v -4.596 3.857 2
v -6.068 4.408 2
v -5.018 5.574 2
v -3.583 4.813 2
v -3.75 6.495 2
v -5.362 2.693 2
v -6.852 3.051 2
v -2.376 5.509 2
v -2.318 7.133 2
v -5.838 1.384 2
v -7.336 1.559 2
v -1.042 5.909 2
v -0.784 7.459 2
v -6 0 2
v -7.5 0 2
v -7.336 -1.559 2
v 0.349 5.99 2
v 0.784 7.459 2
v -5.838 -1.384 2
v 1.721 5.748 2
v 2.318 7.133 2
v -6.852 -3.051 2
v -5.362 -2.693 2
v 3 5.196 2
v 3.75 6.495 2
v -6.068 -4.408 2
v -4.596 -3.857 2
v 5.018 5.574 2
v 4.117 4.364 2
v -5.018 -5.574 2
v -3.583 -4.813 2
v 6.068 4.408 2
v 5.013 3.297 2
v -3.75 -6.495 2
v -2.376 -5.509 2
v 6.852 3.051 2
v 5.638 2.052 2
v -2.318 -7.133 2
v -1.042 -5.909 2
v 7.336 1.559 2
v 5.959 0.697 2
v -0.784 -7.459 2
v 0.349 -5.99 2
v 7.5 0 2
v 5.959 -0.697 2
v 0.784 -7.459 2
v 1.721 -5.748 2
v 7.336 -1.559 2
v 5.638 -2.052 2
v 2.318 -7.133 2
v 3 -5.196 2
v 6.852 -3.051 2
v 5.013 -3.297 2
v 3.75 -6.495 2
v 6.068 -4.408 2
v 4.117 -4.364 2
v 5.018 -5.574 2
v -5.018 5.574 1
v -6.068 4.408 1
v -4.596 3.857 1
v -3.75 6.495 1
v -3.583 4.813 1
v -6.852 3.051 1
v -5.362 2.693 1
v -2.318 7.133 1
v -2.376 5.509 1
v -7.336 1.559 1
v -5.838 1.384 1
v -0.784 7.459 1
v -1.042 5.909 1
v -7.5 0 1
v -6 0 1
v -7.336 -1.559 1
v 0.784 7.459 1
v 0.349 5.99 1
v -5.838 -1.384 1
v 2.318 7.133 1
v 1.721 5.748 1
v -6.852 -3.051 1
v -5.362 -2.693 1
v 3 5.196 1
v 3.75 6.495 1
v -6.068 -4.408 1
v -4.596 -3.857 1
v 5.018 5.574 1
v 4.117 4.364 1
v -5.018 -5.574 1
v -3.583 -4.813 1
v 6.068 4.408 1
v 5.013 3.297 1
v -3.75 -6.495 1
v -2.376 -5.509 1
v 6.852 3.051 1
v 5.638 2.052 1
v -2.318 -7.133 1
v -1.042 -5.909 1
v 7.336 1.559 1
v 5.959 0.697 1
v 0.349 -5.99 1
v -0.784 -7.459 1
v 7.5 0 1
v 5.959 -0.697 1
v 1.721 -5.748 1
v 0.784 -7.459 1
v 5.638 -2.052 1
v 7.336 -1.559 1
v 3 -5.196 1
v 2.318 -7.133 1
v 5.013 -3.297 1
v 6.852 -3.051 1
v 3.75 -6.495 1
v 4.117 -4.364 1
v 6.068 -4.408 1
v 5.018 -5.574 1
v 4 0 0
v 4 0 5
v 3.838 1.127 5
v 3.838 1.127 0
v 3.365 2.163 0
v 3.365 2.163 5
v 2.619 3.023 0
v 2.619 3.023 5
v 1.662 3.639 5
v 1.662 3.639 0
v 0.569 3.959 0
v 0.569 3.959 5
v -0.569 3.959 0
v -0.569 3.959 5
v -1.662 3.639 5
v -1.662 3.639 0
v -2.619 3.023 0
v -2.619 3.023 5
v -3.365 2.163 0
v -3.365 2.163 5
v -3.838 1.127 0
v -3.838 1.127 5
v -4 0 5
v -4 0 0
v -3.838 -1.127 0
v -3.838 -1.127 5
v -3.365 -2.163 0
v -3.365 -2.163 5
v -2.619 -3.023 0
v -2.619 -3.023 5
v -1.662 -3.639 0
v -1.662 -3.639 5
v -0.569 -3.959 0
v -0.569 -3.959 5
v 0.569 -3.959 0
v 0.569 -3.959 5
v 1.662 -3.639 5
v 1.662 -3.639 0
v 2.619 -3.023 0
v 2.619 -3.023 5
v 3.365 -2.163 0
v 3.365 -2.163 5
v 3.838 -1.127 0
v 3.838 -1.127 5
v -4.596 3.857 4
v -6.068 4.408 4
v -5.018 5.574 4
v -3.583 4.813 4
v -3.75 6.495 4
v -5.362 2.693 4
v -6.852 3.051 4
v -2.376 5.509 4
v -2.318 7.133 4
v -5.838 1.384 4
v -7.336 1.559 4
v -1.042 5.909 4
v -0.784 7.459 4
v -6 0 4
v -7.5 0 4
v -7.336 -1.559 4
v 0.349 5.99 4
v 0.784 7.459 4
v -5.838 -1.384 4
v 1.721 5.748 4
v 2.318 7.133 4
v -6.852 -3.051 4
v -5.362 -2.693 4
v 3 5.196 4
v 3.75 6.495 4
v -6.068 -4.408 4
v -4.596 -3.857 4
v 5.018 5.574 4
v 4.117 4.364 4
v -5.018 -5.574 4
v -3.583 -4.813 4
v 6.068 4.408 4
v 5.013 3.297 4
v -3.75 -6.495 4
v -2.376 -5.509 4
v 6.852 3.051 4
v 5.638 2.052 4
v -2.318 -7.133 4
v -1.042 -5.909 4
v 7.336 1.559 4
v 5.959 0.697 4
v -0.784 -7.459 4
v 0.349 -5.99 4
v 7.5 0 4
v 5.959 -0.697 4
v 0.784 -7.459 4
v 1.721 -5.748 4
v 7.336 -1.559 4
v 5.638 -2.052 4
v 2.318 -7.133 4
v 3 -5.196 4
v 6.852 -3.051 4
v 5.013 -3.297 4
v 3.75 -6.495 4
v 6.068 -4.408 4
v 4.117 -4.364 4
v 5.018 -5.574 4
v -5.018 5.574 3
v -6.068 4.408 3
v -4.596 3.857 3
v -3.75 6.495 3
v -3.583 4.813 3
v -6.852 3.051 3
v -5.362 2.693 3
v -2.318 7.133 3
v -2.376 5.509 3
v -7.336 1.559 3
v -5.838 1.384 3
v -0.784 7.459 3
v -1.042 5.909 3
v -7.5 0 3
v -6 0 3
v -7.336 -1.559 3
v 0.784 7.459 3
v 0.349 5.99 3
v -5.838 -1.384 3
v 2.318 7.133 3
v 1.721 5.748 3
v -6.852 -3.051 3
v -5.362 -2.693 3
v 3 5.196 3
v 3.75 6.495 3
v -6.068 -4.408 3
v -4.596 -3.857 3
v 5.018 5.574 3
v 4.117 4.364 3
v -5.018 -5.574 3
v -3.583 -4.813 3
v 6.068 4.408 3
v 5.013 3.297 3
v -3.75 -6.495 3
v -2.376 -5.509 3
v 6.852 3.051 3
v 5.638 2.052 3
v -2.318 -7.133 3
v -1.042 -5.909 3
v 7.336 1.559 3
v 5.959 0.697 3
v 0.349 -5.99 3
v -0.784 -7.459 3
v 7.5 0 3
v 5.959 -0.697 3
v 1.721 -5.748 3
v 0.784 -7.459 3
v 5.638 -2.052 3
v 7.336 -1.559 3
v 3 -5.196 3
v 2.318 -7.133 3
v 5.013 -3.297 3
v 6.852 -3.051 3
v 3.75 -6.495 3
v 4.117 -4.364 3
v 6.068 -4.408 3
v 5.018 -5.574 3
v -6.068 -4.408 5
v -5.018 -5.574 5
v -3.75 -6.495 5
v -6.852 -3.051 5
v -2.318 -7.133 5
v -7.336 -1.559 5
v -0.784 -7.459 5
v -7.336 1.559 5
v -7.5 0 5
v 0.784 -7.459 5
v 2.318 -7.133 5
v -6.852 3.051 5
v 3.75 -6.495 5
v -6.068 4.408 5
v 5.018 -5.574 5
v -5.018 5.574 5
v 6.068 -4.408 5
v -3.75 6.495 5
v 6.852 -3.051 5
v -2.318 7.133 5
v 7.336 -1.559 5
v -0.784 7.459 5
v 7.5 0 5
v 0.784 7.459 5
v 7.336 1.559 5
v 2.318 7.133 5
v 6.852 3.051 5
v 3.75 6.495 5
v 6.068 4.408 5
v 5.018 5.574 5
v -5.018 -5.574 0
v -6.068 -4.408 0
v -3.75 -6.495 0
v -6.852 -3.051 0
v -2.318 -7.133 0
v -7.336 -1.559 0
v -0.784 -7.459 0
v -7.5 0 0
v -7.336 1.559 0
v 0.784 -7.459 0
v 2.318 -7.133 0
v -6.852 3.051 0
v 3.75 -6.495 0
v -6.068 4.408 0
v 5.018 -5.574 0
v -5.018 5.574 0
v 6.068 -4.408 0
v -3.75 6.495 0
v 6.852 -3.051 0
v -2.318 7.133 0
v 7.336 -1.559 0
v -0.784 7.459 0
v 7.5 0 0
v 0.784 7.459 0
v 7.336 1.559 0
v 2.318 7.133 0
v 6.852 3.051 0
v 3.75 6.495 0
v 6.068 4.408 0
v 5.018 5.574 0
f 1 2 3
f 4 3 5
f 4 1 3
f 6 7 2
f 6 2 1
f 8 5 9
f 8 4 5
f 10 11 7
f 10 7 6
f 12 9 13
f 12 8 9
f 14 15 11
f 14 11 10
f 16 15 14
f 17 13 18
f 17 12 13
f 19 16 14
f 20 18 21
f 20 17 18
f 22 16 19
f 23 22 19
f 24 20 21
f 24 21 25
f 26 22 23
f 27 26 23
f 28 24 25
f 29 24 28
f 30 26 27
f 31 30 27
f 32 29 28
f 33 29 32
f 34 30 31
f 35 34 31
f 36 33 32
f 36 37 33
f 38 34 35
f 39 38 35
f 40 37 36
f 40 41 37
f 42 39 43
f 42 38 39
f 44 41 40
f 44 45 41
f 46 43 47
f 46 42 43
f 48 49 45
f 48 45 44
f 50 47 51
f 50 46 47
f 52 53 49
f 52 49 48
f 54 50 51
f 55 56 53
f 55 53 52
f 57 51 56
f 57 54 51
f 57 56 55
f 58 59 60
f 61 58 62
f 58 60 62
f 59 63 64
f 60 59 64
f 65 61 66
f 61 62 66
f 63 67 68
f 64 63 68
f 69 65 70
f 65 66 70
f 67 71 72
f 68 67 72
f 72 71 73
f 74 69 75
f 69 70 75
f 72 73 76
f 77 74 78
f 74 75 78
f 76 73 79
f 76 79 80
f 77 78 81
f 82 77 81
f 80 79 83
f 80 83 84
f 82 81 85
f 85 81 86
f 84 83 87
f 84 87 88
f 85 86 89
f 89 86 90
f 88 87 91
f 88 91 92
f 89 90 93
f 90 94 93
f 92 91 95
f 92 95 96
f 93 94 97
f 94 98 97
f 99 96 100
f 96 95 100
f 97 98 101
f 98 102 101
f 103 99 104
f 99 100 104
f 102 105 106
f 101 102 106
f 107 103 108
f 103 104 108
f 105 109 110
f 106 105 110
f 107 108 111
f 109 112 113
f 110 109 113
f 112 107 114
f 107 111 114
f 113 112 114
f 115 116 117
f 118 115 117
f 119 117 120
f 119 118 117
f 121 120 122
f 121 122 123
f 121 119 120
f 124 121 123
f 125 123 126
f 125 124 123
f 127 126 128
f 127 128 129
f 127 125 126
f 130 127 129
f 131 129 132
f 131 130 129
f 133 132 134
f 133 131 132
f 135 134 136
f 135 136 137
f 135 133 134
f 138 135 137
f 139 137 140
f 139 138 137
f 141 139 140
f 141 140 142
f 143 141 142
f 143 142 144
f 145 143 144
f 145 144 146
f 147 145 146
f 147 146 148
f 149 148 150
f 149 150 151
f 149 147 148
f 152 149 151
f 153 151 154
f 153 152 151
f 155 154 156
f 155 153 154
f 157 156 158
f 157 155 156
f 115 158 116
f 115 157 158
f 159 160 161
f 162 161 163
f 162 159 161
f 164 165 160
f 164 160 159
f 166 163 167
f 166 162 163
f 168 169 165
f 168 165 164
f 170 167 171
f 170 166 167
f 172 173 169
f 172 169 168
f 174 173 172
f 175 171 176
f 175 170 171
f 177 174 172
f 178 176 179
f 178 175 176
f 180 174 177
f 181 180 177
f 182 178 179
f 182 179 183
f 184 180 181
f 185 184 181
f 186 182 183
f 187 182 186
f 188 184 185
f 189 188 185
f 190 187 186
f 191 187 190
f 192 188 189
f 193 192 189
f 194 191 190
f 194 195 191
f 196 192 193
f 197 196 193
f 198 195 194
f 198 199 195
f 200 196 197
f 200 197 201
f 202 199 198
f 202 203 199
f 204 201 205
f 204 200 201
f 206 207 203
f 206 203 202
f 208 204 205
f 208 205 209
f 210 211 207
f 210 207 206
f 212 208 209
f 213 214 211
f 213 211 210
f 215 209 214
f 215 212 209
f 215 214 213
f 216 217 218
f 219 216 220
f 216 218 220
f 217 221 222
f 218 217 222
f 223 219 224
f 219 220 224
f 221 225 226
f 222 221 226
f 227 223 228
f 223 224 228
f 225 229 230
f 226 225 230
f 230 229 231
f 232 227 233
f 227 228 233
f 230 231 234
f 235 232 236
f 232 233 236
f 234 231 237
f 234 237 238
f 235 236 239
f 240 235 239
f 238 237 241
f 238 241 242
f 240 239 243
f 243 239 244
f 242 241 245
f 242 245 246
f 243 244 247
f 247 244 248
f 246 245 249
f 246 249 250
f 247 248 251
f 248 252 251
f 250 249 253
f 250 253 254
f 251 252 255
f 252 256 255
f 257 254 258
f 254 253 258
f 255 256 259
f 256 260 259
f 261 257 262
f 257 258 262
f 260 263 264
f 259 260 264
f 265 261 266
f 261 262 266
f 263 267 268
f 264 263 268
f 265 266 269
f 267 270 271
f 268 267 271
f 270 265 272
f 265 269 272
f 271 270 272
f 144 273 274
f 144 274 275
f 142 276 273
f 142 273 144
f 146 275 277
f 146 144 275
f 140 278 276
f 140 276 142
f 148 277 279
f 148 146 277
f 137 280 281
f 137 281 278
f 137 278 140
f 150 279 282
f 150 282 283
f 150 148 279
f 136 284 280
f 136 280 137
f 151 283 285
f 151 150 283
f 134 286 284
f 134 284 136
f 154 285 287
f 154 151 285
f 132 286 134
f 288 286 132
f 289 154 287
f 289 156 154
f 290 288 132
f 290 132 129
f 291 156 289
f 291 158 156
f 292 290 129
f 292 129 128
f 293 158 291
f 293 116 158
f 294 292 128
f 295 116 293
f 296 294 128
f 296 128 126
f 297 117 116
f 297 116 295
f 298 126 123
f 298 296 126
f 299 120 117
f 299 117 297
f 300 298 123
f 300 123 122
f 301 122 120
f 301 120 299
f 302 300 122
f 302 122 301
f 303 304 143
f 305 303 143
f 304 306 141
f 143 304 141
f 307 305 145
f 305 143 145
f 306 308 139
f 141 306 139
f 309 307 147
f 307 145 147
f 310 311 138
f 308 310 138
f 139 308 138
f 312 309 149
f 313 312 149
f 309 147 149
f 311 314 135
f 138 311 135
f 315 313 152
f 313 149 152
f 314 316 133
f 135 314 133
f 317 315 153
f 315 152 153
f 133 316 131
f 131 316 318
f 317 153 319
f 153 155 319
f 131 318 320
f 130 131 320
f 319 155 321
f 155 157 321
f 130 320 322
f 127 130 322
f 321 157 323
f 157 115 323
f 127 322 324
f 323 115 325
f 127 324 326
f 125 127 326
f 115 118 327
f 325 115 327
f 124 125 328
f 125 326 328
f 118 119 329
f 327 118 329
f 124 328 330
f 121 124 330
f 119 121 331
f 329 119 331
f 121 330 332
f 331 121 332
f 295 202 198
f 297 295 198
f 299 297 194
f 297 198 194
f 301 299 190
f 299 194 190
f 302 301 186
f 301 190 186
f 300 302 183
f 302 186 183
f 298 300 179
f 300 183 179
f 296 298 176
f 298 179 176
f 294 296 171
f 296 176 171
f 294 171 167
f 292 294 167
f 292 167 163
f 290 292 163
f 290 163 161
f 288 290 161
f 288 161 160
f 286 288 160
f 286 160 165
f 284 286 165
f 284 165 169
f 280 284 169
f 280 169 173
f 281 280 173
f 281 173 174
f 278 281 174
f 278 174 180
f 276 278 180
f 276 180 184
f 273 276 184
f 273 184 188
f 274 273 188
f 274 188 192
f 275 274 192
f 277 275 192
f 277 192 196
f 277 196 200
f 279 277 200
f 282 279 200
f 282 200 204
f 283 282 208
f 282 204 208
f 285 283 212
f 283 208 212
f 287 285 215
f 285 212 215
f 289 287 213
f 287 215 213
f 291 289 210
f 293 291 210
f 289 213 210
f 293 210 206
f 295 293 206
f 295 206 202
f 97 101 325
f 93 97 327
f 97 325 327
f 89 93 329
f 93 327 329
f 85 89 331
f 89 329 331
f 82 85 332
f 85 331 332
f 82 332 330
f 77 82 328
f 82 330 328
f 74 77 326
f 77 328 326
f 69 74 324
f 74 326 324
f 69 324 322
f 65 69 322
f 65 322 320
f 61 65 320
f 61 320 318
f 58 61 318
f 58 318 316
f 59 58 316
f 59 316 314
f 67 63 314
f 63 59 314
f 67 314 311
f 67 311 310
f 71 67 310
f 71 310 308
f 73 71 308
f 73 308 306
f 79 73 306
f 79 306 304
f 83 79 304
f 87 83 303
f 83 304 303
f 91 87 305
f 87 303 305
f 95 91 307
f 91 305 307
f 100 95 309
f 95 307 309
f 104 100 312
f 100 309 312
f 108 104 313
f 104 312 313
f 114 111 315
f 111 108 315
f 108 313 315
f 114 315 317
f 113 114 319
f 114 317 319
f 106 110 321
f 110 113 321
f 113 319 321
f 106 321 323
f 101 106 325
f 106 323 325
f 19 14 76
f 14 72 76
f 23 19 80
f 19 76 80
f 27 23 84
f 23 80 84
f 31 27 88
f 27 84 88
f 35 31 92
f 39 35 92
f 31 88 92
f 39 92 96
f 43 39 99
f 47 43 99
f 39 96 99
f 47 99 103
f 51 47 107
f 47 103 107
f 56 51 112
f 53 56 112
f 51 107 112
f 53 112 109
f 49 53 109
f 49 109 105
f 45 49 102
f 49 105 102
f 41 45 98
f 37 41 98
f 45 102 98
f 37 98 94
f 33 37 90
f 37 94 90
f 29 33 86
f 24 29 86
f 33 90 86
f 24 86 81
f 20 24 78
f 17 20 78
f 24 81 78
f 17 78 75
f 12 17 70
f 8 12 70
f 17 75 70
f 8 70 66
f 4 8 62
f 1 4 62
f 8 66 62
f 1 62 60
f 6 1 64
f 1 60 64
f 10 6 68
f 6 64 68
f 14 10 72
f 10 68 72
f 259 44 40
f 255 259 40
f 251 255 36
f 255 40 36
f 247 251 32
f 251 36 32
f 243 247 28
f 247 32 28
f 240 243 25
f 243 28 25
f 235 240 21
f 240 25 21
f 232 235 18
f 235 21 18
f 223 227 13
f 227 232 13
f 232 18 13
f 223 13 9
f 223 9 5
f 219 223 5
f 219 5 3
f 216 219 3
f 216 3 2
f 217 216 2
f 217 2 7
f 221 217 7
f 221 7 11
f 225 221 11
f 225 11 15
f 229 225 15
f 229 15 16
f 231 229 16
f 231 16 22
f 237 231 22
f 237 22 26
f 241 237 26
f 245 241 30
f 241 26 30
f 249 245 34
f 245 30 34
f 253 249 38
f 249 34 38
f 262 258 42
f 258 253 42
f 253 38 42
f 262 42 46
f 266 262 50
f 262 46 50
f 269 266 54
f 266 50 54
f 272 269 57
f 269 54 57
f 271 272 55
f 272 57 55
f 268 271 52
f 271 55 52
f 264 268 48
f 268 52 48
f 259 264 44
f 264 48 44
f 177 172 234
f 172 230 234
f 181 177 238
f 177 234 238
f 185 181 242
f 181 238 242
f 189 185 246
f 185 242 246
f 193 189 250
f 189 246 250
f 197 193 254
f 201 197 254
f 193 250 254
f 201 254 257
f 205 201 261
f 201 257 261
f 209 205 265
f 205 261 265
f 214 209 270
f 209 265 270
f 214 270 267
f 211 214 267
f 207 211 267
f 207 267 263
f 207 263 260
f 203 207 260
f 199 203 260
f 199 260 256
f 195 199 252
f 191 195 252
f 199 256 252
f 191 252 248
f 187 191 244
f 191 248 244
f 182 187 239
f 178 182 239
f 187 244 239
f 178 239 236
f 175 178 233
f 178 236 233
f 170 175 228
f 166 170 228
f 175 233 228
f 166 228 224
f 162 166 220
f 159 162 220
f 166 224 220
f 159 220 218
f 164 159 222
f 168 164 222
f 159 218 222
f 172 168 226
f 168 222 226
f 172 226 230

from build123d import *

# Parameters (mm, degrees)
SKETCH_1_R      = 7.5
SKETCH_1_R_2    = 4
EXTRUDE_1_DEPTH = 5
SKETCH_2_W      = 1
SKETCH_2_H      = 1.5


with BuildPart() as part:
    # 草图1 → 凸台-拉伸1 (new body)
    with BuildSketch(Plane.XY):
        Circle(SKETCH_1_R)
        Circle(SKETCH_1_R_2, mode=Mode.SUBTRACT)
    extrude(amount=EXTRUDE_1_DEPTH)

    # 草图2 → 切除-旋转1 (revolve, cut)
    with BuildSketch(Plane(origin=(0, 0, 0), x_dir=(0, 0, -1), z_dir=(1, 0, 0)), mode=Mode.PRIVATE) as cut_revolve_1_sk:
        with Locations((-3.5, 6.75)):
            Rectangle(SKETCH_2_W, SKETCH_2_H)
        with Locations((-1.5, 6.75)):
            Rectangle(SKETCH_2_W, SKETCH_2_H)
    revolve(cut_revolve_1_sk.sketch.rotate(Axis((0, 0, 0), (0, 0, 1)), 90), axis=Axis((0, 0, 0), (0, 0, 1)), mode=Mode.SUBTRACT)


solid = part.part
